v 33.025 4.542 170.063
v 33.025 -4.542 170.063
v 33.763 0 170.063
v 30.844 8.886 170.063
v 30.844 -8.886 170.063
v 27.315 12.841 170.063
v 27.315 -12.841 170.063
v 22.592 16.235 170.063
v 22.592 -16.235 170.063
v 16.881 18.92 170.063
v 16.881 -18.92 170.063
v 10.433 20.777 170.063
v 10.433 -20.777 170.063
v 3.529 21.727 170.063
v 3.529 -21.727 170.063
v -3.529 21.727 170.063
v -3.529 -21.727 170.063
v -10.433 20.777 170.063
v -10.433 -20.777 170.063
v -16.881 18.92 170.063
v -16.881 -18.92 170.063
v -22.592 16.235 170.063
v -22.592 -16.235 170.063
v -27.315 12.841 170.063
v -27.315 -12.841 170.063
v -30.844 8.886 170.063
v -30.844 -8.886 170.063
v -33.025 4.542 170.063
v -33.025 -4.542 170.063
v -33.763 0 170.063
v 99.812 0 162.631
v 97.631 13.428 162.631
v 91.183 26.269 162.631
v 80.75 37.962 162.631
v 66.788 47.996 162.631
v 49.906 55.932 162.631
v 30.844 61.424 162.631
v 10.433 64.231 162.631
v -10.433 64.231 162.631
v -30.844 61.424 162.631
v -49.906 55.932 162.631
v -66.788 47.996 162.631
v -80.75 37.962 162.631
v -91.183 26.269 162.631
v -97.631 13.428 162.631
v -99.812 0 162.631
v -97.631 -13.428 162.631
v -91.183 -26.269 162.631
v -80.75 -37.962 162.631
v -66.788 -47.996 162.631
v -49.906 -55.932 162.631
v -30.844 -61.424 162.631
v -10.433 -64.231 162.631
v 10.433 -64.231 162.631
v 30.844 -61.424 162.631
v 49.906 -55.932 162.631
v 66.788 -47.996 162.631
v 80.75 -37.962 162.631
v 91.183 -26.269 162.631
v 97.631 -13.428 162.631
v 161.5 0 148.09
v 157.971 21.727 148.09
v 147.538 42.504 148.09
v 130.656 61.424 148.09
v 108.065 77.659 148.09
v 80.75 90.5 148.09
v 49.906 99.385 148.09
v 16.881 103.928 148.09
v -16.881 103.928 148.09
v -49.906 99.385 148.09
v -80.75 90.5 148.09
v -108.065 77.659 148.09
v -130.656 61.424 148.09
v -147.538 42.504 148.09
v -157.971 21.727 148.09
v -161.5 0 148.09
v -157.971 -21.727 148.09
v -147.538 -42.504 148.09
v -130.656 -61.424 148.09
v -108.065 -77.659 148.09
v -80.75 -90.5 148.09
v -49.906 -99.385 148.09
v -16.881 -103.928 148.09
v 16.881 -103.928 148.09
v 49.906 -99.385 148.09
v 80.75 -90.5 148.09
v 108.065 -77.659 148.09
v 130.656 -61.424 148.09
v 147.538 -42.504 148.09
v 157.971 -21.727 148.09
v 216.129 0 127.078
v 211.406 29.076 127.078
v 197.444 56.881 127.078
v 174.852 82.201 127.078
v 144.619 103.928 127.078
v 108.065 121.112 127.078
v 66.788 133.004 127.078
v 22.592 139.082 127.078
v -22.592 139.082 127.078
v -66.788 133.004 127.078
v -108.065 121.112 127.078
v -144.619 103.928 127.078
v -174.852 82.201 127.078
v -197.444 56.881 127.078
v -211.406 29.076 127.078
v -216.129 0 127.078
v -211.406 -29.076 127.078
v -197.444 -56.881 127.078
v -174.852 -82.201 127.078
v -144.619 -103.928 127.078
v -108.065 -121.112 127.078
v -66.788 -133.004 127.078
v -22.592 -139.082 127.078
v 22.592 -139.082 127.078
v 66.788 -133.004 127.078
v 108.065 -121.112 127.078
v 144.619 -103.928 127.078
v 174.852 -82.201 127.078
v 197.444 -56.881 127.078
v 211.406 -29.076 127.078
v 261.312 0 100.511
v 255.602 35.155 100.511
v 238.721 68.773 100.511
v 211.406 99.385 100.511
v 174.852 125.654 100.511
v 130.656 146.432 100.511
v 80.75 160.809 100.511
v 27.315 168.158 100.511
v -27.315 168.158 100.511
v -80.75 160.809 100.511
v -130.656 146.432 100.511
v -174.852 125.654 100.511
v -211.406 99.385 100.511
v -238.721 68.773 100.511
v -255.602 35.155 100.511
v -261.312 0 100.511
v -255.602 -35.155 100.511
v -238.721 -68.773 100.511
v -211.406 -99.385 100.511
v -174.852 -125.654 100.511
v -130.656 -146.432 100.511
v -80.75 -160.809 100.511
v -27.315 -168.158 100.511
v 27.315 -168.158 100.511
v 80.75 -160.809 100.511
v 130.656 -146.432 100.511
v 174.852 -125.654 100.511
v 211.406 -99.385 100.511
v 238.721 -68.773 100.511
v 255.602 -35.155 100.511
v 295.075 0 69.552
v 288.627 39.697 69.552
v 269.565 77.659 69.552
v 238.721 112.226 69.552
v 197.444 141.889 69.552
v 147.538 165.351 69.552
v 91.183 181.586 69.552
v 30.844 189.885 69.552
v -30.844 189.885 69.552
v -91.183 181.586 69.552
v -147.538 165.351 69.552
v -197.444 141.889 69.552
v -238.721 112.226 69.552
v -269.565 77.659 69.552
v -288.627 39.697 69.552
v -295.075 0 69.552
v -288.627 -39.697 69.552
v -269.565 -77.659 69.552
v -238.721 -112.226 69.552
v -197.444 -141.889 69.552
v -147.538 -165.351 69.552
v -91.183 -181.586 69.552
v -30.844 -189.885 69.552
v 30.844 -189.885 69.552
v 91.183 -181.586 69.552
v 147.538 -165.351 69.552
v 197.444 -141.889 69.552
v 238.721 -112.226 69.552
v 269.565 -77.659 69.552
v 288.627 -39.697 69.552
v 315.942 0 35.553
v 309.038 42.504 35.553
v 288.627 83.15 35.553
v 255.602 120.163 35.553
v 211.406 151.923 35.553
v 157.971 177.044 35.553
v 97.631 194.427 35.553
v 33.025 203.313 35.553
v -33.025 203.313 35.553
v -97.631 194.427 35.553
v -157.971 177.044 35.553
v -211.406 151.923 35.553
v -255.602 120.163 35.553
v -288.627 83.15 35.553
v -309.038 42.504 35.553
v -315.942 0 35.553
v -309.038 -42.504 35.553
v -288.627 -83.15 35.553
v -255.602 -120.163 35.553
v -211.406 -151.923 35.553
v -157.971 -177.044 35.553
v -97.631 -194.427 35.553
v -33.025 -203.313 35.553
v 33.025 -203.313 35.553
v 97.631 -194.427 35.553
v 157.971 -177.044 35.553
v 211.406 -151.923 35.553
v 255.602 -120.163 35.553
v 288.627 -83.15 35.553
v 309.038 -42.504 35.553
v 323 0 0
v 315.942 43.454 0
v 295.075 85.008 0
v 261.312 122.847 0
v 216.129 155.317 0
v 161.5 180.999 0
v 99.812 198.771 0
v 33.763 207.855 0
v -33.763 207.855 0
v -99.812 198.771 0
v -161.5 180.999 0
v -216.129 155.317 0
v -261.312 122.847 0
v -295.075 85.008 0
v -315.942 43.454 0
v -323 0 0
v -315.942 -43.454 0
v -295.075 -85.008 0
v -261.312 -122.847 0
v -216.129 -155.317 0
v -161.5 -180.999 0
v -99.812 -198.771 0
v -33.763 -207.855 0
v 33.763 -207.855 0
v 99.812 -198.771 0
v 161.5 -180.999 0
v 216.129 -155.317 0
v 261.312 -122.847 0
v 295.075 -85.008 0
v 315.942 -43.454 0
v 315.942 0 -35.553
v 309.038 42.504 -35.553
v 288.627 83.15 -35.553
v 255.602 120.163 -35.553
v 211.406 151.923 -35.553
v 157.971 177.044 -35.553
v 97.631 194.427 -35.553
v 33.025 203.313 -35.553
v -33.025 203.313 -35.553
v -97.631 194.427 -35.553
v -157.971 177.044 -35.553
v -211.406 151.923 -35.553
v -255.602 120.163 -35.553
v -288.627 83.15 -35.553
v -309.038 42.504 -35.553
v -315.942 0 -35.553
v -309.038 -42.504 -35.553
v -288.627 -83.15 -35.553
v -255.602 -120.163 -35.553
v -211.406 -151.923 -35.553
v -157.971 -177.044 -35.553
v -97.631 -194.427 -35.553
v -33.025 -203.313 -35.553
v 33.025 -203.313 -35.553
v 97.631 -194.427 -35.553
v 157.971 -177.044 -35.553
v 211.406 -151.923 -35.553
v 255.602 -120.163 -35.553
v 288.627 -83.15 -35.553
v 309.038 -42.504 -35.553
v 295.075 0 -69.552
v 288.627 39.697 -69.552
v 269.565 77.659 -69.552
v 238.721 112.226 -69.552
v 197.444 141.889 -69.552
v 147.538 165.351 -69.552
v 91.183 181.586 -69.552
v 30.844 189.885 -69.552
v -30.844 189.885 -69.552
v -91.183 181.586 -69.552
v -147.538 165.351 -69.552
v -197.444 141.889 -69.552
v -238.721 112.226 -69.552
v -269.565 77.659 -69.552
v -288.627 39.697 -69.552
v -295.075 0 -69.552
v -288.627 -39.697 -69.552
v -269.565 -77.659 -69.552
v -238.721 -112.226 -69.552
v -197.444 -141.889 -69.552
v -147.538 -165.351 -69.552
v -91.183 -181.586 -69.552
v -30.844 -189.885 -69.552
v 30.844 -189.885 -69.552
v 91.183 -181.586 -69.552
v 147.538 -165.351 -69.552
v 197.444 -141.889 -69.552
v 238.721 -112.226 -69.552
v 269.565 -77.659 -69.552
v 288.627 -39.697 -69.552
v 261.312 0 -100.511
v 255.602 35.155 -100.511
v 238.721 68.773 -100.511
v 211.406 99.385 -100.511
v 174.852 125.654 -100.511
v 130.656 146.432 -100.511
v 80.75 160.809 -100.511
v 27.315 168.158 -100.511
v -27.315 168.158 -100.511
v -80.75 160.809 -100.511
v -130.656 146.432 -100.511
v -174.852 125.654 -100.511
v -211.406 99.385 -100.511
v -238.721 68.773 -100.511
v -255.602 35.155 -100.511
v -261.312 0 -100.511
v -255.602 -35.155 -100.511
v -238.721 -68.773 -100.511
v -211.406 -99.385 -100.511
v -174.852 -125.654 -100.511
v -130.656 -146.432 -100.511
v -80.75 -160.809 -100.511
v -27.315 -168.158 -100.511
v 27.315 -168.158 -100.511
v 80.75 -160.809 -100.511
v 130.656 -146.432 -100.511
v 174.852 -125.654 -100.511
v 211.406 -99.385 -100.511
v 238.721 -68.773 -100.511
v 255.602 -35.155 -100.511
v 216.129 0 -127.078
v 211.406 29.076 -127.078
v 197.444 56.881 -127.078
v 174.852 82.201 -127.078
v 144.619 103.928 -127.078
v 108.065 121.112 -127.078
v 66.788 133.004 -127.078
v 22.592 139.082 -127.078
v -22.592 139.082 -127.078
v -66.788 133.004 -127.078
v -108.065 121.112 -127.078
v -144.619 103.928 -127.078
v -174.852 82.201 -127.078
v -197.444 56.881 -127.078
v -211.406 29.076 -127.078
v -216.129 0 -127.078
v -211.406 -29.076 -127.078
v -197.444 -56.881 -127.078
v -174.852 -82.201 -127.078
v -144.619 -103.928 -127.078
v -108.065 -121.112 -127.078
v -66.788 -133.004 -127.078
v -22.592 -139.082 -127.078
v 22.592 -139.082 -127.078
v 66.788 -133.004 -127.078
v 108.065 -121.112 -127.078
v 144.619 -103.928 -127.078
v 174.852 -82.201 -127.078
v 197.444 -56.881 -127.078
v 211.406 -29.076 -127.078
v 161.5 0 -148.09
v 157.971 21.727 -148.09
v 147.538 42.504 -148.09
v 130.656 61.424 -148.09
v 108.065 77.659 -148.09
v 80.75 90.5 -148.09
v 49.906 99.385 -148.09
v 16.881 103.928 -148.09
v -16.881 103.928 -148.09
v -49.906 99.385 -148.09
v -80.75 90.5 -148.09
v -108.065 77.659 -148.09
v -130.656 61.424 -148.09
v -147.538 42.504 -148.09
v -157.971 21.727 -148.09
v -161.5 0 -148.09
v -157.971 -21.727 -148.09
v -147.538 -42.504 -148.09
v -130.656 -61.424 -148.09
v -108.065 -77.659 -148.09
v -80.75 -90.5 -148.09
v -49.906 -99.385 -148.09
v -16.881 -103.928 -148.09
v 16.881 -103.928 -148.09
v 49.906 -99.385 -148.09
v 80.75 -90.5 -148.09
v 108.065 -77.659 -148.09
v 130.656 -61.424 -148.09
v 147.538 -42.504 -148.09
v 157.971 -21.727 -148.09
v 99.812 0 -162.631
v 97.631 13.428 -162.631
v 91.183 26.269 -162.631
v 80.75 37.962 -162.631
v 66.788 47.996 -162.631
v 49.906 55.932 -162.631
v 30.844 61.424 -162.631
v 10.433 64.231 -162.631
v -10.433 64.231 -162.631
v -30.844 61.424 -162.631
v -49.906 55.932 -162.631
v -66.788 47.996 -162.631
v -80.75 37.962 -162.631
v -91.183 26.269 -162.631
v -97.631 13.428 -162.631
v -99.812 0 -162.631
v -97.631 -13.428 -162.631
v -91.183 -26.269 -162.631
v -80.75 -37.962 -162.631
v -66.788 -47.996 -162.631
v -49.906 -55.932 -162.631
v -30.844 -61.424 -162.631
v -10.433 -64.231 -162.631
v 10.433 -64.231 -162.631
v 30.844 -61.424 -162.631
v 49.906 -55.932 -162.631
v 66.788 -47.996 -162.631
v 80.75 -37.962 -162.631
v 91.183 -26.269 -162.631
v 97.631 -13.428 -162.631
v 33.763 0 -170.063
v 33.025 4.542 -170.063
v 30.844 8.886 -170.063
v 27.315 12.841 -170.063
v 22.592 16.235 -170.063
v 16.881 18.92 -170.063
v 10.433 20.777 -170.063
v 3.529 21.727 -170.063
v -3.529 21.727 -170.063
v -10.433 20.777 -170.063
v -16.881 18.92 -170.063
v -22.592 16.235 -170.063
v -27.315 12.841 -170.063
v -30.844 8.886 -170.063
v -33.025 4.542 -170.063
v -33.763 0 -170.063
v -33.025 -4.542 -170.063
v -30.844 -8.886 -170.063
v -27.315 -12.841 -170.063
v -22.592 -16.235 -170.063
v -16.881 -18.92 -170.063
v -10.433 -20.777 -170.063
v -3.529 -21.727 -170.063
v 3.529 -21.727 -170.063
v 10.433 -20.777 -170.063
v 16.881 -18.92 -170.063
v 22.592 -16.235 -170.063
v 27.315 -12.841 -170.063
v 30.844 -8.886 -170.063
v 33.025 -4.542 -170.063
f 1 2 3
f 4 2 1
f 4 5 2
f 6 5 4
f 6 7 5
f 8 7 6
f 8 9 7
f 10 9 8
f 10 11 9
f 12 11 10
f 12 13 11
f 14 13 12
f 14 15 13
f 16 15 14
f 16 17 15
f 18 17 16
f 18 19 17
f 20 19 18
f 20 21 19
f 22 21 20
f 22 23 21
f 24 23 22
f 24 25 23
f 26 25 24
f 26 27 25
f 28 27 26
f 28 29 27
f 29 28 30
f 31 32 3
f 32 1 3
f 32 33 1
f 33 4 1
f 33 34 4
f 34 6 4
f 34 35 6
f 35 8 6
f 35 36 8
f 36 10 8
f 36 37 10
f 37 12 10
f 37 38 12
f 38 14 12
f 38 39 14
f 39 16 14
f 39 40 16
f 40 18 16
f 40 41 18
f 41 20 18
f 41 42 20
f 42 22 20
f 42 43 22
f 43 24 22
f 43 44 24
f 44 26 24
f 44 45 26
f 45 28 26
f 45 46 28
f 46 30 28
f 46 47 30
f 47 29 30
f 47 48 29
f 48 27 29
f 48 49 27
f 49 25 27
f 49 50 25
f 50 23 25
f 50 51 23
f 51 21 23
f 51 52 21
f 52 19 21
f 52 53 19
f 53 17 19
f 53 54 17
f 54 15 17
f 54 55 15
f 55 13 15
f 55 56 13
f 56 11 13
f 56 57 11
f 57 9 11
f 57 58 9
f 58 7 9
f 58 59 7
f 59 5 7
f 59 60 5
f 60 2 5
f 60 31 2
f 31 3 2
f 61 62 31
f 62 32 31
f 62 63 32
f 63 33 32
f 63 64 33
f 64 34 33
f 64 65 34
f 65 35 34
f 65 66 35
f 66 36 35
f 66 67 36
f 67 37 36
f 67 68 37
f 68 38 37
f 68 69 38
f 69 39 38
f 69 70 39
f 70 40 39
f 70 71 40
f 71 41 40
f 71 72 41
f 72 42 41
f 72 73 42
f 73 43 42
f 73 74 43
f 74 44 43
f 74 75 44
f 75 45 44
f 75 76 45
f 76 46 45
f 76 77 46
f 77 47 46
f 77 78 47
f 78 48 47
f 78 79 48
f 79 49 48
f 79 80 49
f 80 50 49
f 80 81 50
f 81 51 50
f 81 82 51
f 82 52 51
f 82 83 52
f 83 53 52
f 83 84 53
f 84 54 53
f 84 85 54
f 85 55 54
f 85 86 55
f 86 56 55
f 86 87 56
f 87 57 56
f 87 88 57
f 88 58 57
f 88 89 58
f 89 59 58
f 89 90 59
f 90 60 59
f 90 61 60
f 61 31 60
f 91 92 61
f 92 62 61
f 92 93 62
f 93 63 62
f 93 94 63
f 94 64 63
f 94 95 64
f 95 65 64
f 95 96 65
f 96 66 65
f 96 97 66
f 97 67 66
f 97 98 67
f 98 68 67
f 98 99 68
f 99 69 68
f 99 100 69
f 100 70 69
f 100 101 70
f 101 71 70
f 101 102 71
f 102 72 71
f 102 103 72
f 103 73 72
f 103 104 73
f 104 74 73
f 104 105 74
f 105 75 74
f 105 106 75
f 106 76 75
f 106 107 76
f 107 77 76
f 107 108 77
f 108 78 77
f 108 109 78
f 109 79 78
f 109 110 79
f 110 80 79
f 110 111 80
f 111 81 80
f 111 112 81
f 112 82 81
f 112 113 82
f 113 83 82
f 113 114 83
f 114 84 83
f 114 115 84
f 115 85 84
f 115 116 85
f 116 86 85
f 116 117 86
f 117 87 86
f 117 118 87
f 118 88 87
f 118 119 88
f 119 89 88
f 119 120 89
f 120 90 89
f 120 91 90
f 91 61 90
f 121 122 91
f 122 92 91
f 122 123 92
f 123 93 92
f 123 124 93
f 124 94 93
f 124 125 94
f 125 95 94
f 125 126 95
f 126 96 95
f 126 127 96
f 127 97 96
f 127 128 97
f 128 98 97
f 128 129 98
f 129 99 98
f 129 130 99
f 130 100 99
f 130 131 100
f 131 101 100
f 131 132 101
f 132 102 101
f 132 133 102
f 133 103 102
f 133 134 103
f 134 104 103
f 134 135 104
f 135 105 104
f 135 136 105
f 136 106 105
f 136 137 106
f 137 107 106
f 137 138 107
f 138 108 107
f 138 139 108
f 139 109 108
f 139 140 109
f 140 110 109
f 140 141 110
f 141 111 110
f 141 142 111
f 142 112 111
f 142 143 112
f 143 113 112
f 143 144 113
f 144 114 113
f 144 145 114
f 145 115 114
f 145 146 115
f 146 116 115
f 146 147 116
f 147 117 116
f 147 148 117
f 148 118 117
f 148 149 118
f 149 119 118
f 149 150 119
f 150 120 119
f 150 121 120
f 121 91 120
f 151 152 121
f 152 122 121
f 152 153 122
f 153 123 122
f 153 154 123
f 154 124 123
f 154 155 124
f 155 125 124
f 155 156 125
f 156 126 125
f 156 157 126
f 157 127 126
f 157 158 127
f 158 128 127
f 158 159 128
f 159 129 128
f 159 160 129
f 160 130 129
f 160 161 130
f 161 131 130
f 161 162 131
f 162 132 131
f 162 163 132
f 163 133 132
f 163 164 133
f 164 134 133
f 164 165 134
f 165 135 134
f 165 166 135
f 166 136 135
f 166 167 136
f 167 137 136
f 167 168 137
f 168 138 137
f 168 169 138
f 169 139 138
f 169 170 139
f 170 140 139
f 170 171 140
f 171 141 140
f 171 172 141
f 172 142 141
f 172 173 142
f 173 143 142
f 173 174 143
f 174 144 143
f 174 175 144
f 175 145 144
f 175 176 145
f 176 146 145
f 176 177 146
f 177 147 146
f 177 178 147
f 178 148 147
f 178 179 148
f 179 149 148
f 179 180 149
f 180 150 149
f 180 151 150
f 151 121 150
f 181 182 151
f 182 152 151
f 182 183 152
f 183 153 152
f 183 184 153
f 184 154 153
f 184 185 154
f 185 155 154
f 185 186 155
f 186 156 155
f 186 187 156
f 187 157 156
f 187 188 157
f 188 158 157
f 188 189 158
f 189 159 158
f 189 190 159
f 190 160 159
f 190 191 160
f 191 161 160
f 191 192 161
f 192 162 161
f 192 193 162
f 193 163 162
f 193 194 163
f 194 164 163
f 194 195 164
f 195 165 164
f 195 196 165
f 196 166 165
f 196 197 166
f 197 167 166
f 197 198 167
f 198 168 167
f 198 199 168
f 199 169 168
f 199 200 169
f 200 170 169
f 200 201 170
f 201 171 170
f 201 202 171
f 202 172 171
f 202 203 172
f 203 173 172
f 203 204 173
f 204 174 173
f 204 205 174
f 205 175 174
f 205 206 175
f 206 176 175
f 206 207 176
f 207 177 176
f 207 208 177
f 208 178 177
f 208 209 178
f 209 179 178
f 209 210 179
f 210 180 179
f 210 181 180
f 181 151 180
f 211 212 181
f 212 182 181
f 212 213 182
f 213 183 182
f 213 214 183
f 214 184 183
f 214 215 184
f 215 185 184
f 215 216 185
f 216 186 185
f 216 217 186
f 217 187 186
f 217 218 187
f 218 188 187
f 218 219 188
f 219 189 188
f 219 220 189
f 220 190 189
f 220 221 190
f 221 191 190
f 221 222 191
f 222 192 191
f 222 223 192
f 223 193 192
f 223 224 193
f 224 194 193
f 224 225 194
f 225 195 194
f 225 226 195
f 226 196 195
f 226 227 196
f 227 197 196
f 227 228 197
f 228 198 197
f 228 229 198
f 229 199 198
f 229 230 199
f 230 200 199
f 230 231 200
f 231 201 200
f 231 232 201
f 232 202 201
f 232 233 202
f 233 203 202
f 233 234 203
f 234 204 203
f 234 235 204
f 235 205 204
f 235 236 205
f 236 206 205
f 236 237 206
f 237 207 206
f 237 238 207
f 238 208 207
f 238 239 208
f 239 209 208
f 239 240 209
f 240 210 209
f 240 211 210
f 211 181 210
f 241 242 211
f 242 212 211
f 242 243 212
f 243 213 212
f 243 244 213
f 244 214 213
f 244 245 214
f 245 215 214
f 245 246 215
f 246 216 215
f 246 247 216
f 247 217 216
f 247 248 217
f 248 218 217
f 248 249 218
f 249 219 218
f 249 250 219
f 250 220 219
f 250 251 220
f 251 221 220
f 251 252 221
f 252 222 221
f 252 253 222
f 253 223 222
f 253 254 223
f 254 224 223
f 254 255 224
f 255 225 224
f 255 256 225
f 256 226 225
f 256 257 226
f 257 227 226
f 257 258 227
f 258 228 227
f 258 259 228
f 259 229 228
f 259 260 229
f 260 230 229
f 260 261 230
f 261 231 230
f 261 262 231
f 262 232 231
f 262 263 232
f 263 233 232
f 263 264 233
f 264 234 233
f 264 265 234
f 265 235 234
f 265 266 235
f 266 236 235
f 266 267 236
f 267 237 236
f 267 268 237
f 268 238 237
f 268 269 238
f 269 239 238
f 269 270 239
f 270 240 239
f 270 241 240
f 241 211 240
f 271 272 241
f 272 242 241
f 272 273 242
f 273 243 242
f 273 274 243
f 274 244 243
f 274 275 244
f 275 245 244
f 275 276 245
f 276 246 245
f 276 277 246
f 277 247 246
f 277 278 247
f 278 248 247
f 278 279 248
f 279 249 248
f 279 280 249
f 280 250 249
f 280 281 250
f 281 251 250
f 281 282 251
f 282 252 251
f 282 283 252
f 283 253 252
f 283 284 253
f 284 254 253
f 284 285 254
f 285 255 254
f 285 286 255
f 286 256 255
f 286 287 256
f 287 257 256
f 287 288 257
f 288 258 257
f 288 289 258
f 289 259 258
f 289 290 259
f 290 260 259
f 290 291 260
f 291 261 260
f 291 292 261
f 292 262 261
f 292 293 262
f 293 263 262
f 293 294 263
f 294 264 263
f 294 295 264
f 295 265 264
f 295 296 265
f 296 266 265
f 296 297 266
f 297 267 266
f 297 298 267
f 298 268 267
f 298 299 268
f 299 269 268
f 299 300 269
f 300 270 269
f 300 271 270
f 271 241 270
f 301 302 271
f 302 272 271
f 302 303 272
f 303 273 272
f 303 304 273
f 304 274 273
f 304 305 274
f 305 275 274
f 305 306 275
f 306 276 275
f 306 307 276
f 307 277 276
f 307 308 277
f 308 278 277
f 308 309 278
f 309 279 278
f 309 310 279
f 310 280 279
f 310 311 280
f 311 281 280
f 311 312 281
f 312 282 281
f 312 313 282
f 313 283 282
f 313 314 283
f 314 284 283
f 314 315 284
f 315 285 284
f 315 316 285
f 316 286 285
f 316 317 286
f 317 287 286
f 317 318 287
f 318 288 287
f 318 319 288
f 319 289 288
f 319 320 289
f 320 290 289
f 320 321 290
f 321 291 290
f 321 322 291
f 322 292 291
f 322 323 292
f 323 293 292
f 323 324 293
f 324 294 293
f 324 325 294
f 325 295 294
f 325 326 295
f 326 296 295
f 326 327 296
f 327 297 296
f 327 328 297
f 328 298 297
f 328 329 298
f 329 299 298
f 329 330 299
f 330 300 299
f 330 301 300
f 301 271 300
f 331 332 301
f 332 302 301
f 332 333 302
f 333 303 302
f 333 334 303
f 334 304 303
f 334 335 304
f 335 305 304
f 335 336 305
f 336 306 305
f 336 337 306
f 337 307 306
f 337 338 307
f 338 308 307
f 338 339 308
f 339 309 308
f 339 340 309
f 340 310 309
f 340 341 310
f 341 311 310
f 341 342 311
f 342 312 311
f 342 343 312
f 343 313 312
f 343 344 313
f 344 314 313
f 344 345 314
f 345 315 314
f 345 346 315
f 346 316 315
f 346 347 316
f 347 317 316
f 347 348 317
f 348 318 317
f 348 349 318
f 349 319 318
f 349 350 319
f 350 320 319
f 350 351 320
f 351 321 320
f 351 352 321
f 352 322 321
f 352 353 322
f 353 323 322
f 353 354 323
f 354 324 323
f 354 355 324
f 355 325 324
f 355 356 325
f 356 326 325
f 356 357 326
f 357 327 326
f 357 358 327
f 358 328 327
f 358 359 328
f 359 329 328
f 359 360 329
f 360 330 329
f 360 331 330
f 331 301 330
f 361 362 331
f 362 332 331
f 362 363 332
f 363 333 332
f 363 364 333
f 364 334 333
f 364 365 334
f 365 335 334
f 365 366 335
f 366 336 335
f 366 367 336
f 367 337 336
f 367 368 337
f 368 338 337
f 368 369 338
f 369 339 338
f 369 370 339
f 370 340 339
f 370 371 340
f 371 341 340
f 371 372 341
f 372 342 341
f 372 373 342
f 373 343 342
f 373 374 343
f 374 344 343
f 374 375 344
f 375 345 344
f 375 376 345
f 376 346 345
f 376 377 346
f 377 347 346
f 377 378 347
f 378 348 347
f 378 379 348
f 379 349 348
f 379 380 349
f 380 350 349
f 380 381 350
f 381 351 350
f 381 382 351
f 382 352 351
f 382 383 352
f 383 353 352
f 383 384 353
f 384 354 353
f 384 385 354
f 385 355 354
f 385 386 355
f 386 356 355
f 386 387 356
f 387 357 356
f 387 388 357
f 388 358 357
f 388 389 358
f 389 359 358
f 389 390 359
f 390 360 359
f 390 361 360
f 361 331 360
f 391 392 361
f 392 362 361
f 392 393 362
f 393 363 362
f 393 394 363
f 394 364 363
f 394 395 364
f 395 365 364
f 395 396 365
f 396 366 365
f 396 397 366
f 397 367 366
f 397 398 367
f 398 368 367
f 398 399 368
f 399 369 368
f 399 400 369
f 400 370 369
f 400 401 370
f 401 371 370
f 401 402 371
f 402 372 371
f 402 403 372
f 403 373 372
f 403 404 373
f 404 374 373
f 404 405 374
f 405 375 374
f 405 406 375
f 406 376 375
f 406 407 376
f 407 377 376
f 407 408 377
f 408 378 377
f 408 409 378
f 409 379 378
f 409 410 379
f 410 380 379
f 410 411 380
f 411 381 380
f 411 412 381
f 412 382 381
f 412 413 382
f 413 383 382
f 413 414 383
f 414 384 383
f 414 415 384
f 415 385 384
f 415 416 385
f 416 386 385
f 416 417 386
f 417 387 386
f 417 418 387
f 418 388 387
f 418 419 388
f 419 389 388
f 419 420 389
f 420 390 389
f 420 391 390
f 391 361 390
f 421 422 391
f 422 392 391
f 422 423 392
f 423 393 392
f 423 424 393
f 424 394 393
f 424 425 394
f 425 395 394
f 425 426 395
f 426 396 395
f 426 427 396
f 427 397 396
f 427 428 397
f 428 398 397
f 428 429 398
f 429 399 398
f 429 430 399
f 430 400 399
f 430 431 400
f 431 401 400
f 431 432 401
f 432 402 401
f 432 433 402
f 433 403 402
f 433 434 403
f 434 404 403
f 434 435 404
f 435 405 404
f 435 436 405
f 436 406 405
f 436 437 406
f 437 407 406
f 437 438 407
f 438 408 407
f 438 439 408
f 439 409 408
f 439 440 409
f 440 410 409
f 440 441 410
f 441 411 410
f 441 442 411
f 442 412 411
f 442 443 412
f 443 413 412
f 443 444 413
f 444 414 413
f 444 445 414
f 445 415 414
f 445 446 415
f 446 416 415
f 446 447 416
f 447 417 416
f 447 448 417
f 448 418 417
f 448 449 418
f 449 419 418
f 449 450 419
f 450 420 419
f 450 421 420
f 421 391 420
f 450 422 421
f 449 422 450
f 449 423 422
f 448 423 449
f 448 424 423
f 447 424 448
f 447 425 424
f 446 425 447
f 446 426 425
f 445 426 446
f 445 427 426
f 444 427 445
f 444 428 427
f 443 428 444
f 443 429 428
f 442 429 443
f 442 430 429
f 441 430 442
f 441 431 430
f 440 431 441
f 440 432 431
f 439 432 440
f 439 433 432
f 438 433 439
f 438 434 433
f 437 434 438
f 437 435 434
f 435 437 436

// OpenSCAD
// Generated by SolidPython 1.0.1 on 2020-07-29 00:46:53


scale(v = [17, 11, 9]) {
	sphere(r = 19);
}
/***********************************************
*********      SolidPython code:      **********
************************************************
 
# import packages: SolidPython
from solid import *
from solid.utils import *
from itertools import chain, combinations, permutations


class Resize:

    def __init__(self, scad_file):
        self.scad_file = scad_file
        #self.scad_file = import_scad(scad_file)
        # cone/cylinder param:
        self.r1 = 0
        self.r2 = 0
        self.h = 0
        # rectangular prism param:
        self.w = 0
        self.l = 0
        # ellipse param:
        self.r = 0

    # import OpenScad code (file name corresponds to shape)


    # classify shape + parameters
    def assign(self, param1, param2, param3):
        if self.scad_file == 'cone.scad':
            self.r1 = param1
            self.r2 = param2
            self.h = param3
        elif self.scad_file == 'cylinder.scad':
            self.r1 = param1
            self.r2 = param2
            self.h = param3
        elif self.scad_file == 'rectangularPrism.scad':
            self.h = param1
            self.l = param2
            self.w = param3
        else:
            self.r = param1
            self.h = param2

    # resize parameters
    def iterate(self):
        x = range(3, 20, 2)
        i = 1
        if self.scad_file == 'cone.scad':
            tempList = list(permutations(x, 2))
            for temp in tempList:
                param1 = temp[0]
                param2 = temp[1]
                filepath = 'produced_scad_files/' + 'cone' + str(param1) + '_' + str(param2) + '_' + '.scad'
                scad_render_to_file(cylinder(h=param1, r1=param2, r2=0), filepath)

        elif self.scad_file == 'cylinder.scad':
            tempList = list(permutations(x, 3))
            for temp in tempList:
                param1 = temp[0]
                param2 = temp[1]
                filepath = 'produced_scad_files/' + 'cylinder' + str(param1) + '_' + str(param2) + '_' + '.scad'
                scad_render_to_file(cylinder(h=param1, r1=param2, r2=param2), filepath)

        elif self.scad_file == 'rectangularPrism.scad':
            tempList = list(permutations(x, 3))
            for temp in tempList:
                param1 = temp[0]
                param2 = temp[1]
                param3 = temp[2]
                filepath = 'produced_scad_files/' + 'rectangularPrism' + str(param1) + '_' + str(param2) + '_' + str(
                    param3) + '.scad'
                scad_render_to_file(cube(size=(param1, param2, param3)), filepath)

        elif self.scad_file == 'ellipse.scad':
            tempList = list(permutations(x, 4))
            for temp in tempList:
                param1 = temp[0]
                param2 = temp[1]
                param3 = temp[2]
                param4 = temp[3]
                filepath = 'produced_scad_files/' + 'ellipse' + str(param1) + '_' + str(param2) + '_' + str(param3) + '_' + str(param4) + '.scad'
                scad_render_to_file(scale([param1, param2, param3])(sphere(r=param4)), filepath)

    def render_to_scadfile(self):
        scad_render_to_file(scad, 'example.scad') 
 
************************************************/
